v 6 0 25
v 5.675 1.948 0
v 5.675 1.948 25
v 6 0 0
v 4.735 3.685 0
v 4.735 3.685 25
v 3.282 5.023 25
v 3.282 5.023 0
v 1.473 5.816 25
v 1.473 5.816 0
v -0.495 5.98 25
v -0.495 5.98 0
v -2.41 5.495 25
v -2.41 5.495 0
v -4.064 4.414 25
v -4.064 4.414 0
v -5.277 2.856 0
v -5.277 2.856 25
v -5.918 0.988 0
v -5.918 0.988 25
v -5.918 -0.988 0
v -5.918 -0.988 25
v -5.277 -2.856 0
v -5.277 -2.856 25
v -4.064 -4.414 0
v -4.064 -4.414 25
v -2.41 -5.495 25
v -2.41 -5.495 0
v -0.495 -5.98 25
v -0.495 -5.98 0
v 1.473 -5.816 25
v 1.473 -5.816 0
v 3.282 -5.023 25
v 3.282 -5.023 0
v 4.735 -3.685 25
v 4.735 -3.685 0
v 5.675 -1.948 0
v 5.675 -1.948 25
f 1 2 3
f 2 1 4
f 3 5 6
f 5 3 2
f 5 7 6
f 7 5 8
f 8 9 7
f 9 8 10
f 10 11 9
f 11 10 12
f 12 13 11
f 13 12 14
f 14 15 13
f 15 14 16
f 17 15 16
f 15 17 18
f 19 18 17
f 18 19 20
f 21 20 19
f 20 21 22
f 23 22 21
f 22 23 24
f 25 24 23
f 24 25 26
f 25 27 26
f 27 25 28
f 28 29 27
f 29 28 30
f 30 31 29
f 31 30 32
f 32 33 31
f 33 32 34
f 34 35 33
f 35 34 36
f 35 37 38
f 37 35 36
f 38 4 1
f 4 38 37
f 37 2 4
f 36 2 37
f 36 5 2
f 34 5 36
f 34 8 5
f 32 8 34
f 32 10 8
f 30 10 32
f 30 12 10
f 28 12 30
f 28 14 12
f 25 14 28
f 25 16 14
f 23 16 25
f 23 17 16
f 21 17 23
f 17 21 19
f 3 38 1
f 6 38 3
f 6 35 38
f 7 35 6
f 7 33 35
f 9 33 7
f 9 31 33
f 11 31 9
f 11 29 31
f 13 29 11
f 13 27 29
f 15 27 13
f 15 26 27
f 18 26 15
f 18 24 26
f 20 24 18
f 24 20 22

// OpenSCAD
// Generated by generate_scads.py
cylinder(h=25, r=6, center=false);
